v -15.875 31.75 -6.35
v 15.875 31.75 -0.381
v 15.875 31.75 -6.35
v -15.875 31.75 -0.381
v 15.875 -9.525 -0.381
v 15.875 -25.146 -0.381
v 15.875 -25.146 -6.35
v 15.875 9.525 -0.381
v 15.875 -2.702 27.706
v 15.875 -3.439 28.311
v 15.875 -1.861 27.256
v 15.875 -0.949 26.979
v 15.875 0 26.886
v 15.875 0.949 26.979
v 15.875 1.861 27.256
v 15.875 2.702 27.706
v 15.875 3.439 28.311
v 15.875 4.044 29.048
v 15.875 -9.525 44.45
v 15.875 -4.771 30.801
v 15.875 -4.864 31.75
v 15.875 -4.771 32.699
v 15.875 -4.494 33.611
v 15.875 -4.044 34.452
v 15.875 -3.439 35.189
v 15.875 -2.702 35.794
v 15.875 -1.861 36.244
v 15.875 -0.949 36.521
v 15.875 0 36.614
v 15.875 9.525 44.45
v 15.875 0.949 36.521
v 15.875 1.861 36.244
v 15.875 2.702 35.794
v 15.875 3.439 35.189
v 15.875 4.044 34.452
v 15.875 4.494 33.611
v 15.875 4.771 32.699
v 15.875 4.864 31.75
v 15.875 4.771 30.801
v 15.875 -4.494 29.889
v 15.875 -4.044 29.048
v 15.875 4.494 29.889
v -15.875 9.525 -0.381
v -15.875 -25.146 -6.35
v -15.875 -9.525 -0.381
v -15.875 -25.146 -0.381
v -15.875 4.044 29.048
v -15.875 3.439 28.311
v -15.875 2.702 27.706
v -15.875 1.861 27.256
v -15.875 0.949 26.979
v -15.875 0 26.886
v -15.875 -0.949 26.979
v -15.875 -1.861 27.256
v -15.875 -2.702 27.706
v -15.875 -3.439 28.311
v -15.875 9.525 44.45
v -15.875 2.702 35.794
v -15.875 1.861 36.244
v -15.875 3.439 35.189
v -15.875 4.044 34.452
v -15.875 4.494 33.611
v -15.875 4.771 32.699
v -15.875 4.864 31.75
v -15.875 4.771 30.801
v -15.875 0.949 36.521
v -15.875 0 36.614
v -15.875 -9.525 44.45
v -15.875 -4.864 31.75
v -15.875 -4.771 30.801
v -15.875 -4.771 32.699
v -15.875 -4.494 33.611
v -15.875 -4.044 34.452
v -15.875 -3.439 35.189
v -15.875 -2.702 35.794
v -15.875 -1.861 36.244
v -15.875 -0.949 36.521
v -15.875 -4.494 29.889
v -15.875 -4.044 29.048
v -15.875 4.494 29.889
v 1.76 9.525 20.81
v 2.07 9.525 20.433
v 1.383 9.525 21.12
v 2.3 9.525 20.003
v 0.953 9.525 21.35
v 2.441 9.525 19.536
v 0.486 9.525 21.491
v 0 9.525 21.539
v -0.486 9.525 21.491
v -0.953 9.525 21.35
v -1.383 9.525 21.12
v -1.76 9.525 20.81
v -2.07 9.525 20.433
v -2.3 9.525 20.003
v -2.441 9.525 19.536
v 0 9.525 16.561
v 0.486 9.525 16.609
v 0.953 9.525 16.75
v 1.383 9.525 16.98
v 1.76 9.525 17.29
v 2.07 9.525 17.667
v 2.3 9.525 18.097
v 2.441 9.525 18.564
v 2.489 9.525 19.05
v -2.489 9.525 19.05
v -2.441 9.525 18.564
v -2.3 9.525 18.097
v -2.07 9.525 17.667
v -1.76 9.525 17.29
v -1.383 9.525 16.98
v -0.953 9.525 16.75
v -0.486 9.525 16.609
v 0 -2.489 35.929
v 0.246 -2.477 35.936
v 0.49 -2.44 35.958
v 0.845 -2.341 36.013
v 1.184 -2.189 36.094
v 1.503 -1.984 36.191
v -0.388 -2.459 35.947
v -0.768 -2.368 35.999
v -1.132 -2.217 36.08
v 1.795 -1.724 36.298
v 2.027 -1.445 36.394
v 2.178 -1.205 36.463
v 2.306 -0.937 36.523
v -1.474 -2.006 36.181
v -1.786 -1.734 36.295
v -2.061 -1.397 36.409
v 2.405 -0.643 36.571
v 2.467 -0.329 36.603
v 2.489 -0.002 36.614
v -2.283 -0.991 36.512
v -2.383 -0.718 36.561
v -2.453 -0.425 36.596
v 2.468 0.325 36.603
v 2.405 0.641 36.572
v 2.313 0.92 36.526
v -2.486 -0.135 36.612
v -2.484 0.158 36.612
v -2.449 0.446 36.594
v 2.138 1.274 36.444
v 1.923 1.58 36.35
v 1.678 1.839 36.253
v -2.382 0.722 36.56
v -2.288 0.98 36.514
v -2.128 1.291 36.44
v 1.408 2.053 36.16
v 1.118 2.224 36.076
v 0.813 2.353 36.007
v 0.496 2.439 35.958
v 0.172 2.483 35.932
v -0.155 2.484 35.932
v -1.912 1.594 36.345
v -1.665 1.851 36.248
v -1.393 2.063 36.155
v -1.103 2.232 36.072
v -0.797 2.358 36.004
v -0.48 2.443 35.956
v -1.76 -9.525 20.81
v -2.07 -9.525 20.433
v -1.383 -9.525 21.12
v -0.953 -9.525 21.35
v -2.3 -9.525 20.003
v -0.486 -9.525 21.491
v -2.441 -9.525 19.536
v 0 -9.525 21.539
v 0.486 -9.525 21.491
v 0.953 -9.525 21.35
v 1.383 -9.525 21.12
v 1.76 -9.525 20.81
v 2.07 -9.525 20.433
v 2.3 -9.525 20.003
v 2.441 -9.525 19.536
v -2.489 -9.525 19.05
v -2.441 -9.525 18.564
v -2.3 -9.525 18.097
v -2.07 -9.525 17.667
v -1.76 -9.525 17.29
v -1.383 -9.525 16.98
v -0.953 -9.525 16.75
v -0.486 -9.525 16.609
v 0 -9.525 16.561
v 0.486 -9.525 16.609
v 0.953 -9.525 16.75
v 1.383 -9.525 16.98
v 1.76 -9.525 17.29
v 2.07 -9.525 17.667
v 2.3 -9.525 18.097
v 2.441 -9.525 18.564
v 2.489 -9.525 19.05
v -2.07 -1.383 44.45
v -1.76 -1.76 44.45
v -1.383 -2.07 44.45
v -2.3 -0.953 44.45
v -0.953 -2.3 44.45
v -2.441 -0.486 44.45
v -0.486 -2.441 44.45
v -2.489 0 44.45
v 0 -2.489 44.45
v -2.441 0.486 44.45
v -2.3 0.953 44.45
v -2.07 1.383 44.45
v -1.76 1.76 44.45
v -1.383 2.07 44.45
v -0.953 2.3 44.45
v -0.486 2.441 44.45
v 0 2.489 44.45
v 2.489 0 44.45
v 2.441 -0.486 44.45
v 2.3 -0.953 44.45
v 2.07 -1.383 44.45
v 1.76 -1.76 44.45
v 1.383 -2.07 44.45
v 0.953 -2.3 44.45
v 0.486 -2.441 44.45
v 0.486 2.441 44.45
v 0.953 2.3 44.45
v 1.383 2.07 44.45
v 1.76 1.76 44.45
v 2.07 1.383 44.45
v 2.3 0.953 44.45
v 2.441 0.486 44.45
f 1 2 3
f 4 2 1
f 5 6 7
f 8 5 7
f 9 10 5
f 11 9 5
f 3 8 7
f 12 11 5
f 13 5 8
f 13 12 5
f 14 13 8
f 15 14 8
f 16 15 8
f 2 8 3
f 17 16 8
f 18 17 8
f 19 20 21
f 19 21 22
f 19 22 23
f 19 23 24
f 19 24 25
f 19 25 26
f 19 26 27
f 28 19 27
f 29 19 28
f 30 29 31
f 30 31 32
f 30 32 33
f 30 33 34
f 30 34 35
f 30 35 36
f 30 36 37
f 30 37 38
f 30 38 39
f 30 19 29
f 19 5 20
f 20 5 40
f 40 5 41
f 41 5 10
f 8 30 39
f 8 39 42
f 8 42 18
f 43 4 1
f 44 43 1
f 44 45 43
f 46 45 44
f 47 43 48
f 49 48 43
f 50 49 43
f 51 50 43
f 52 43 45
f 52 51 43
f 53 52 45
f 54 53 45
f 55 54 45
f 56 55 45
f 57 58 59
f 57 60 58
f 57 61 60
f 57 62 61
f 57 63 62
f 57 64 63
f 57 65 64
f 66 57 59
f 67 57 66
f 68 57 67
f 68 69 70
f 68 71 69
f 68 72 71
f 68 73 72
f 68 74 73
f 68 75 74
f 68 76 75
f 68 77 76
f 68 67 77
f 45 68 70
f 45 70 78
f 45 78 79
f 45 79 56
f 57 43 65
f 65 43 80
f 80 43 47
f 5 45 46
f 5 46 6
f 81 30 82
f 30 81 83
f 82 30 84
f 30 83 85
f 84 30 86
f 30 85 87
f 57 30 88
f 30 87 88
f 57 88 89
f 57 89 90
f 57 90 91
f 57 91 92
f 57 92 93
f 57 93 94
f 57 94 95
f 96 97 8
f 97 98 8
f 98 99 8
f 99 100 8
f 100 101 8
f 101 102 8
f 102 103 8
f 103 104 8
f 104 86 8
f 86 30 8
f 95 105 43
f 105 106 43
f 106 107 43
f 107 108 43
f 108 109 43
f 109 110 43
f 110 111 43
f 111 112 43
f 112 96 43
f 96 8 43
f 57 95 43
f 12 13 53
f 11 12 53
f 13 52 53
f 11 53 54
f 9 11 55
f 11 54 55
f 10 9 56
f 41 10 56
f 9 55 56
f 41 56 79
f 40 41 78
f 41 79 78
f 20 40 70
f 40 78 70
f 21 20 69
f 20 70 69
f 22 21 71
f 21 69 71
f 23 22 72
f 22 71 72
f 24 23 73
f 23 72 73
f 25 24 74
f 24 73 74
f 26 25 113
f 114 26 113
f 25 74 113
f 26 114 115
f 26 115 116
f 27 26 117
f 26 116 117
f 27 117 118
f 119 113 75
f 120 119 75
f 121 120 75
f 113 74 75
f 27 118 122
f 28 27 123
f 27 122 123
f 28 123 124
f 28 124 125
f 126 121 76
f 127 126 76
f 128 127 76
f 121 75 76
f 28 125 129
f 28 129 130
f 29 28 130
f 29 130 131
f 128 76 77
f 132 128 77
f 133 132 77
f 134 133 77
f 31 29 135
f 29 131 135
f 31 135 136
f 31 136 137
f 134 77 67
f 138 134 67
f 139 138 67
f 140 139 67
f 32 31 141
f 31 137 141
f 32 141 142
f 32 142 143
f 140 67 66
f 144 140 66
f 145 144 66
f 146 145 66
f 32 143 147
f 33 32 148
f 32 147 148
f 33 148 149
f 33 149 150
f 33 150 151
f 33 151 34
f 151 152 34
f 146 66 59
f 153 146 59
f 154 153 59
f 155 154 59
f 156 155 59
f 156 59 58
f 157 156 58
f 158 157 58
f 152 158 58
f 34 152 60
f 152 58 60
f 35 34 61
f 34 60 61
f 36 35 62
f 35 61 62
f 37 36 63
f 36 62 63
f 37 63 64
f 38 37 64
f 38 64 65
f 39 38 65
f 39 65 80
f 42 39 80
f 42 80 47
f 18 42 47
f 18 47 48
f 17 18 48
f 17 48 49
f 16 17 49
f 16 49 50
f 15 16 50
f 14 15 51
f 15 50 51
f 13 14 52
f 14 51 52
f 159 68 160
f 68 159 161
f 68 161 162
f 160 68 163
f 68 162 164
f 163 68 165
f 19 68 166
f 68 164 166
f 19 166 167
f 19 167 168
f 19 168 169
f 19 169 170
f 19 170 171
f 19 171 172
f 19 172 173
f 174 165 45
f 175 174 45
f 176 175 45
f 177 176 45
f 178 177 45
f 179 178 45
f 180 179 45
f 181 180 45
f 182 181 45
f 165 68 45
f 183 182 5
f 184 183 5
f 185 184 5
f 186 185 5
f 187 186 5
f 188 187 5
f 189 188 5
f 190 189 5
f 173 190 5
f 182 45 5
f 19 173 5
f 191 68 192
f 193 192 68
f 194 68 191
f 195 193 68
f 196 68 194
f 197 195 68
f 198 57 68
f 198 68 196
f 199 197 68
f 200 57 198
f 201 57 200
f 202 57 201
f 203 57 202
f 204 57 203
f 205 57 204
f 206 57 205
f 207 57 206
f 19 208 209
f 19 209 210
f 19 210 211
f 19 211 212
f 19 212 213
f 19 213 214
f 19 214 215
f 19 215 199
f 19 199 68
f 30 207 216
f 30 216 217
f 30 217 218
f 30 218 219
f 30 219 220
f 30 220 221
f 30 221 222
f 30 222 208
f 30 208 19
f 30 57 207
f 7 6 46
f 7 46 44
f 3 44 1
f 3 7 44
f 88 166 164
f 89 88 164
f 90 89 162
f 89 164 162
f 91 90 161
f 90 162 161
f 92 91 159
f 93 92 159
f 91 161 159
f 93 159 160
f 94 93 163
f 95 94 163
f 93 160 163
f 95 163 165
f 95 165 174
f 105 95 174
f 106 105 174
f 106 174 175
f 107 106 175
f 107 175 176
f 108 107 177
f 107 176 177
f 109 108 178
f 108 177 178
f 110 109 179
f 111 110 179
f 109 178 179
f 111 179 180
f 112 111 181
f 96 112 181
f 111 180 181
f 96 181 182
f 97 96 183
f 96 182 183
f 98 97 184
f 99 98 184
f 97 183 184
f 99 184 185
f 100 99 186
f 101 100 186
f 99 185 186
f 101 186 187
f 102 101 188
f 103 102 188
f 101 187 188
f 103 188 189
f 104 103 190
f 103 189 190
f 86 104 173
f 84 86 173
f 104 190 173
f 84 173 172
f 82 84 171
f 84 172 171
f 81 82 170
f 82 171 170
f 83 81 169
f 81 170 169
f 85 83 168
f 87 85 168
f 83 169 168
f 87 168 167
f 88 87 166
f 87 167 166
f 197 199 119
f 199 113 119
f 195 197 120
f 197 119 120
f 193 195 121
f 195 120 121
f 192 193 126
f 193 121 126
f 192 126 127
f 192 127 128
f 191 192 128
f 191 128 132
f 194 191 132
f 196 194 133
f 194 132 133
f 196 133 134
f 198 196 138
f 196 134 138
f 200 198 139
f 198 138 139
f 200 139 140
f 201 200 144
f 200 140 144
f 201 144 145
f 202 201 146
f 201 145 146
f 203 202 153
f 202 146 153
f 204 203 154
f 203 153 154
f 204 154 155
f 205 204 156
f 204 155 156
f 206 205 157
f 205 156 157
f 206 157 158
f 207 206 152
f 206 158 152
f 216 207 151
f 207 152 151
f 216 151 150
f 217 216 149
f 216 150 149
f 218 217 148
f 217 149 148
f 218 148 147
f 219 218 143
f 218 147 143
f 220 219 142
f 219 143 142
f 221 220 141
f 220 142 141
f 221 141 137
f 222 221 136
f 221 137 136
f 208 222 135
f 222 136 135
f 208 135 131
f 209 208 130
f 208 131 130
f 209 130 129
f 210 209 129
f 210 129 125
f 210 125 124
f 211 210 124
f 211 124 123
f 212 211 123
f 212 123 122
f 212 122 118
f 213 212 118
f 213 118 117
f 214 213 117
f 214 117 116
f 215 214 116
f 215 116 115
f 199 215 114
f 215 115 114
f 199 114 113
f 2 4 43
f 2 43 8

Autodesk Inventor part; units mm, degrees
ref_plane "YZ Plane" through (0, 0, 0) normal (1, 0, 0) x (0, 1, 0)
ref_plane "XZ Plane" through (0, 0, 0) normal (0, 1, 0) x (-1, 0, 0)
ref_plane "XY Plane" through (0, 0, 0) normal (0, 0, 1) x (1, 0, 0)
sketch "Sketch1" plane through (0, 0, 0) normal (0, 0, 1) x (1, 0, 0)
  line L0 (-15.875, -31.75) -> (15.875, -31.75)
  line L1 (15.875, -31.75) -> (15.875, 31.75)
  line L2 (15.875, 31.75) -> (-15.875, 31.75)
  line L3 (-15.875, 31.75) -> (-15.875, -31.75)
  line L4 (-15.875, -31.75) -> (15.875, 31.75) construction
  line L5 (15.875, -31.75) -> (-15.875, 31.75) construction
  point P0 (0, 0)
  dimension "height" = 63.5
  dimension "width" = 31.75
extrude "Extrusion1" add sketch "Sketch1" against normal blind 12.7
sketch "Sketch3" plane through (0, 0, 0) normal (0, 0, 1) x (1, 0, 0)
  line L0 (-15.875, -9.525) -> (15.875, -9.525)
  line L1 (15.875, -9.525) -> (15.875, 9.525)
  line L2 (15.875, 9.525) -> (-15.875, 9.525)
  line L3 (-15.875, 9.525) -> (-15.875, -9.525)
  line L4 (-15.875, -9.525) -> (15.875, 9.525) construction
  line L5 (15.875, -9.525) -> (-15.875, 9.525) construction
  line L6 (15.875, 31.75) -> (-15.875, 31.75) projected
  point P0 (0, 0)
  dimension "Channel_Width" = 19.05
  dimension "d52" = 31.75
extrude "Extrusion3" add sketch "Sketch3" along normal blind 44.45
sketch "Sketch6" plane through (15.875, -31.75, -12.7) normal (1, 0, 0) x (0, 0, -1)
  line L0 (-12.7, 31.75) -> (-57.15, 31.75) construction
  line L1 (-57.15, 22.225) -> (-57.15, 41.275) construction
  line L2 (-12.7, 41.275) -> (-12.7, 63.5) construction
  point P0 (-44.45, 31.75)
  dimension "d53" = 31.75
hole "Hole5" at (15.875, 0, 31.75) direction (-1, 0, 0) diameter 9.7282 end through all thread size "7/16-20 UNF" class "2B" standard "ANSI Unified Screw Threads"
sketch "Sketch13" plane through (15.875, -31.75, -12.7) normal (1, 0, 0) x (0, 0, -1)
  line L0 (-12.7, 63.5) -> (0, 63.5) projected
  line L1 (0, 0) -> (-6.35, 0)
  line L2 (-6.35, 0) -> (-6.35, 63.5)
  line L3 (-6.35, 63.5) -> (0, 63.5)
  line L4 (0, 63.5) -> (0, 0)
  point P0 (-12.7, 31.75)
  dimension "d98" = 6.35
extrude "Extrusion5" cut sketch "Sketch13" against normal through all
sketch "Sketch14" plane through (-15.875, -31.75, 0) normal (-1, 0, 0) x (0, 0, 1)
  line L0 (0, 0) -> (-6.35, 0) projected
  line L1 (0, 0) -> (0, 22.225) projected
  line L2 (-6.35, 0) -> (0, 0)
  line L3 (0, 0) -> (0, 6.604)
  line L4 (0, 6.604) -> (-6.35, 6.604)
  line L5 (-6.35, 6.604) -> (-6.35, 0)
  point P0 (0, 31.75)
  dimension "d101" = 6.604
extrude "Extrusion6" cut sketch "Sketch14" against normal through all
sketch "Sketch15" plane through (-15.875, 9.525, 0) normal (0, 1, 0) x (1, 0, 0)
  line L0 (31.75, -44.45) -> (0, -44.45) projected
  line L1 (0, 0) -> (0, -44.45) projected
  point P0 (15.875, 0)
  point P1 (15.875, -19.05)
  dimension "d104" = 25.4
  dimension "d123" = 15.875
hole "Hole11" at (0, 9.525, 19.05) direction (0, -1, 0) diameter 4.9784 end through all thread size "1/4-20 UNC" class "2B" standard "ANSI Unified Screw Threads"
sketch "Sketch11" plane through (0, 0, 44.45) normal (0, 0, 1) x (1, 0, 0)
  point P0 (0, 0)
hole "Hole12" at (0, 0, 44.45) direction (0, 0, -1) diameter 4.9784 depth 12.7 tip angle 118 thread size "1/4-20 UNC" class "2B" standard "ANSI Unified Screw Threads"
sketch "Sketch16" plane through (15.875, 9.525, 0) normal (1, 0, 0) x (0, 0, -1)
  point P0 (0, -9.525)
sketch "Sketch17" plane through (0, 0, 0) normal (0, 0, 1) x (1, 0, 0)
  line L0 (-15.875, 31.75) -> (-15.875, 9.525) projected
  line L1 (-15.875, 9.525) -> (15.875, 9.525) projected
  line L2 (-15.875, 31.75) -> (15.875, 31.75)
  line L3 (15.875, 31.75) -> (15.875, 9.525)
  line L4 (15.875, 9.525) -> (-15.875, 9.525)
  line L5 (-15.875, 9.525) -> (-15.875, 31.75)
  point P0 (0, 0)
extrude "Extrusion7" cut sketch "Sketch17" against normal blind 0.381
sketch "Sketch18" plane through (0, 0, 0) normal (0, 0, 1) x (1, 0, 0)
  line L0 (-15.875, -25.146) -> (15.875, -25.146) projected
  line L1 (15.875, -9.525) -> (15.875, 9.525) projected
  line L2 (-15.875, -25.146) -> (15.875, -25.146)
  line L3 (15.875, -25.146) -> (15.875, -9.525)
  line L4 (15.875, -9.525) -> (-15.875, -9.525)
  line L5 (-15.875, -9.525) -> (-15.875, -25.146)
  point P0 (0, 0)
extrude "Extrusion8" cut sketch "Sketch18" against normal blind 0.381
sketch "Sketch10" plane through (0, 0, 44.45) normal (0, 0, 1) x (1, 0, 0)
  point P0 (0, 0)
sketch "Sketch12" plane through (-15.875, -9.525, 0) normal (0, -1, 0) x (1, 0, 0)
  point P0 (15.875, 15.875)
equation "\"d52\" = width"
properties part number "AsBuilt Support For Arms" material "Aluminum 6061"
